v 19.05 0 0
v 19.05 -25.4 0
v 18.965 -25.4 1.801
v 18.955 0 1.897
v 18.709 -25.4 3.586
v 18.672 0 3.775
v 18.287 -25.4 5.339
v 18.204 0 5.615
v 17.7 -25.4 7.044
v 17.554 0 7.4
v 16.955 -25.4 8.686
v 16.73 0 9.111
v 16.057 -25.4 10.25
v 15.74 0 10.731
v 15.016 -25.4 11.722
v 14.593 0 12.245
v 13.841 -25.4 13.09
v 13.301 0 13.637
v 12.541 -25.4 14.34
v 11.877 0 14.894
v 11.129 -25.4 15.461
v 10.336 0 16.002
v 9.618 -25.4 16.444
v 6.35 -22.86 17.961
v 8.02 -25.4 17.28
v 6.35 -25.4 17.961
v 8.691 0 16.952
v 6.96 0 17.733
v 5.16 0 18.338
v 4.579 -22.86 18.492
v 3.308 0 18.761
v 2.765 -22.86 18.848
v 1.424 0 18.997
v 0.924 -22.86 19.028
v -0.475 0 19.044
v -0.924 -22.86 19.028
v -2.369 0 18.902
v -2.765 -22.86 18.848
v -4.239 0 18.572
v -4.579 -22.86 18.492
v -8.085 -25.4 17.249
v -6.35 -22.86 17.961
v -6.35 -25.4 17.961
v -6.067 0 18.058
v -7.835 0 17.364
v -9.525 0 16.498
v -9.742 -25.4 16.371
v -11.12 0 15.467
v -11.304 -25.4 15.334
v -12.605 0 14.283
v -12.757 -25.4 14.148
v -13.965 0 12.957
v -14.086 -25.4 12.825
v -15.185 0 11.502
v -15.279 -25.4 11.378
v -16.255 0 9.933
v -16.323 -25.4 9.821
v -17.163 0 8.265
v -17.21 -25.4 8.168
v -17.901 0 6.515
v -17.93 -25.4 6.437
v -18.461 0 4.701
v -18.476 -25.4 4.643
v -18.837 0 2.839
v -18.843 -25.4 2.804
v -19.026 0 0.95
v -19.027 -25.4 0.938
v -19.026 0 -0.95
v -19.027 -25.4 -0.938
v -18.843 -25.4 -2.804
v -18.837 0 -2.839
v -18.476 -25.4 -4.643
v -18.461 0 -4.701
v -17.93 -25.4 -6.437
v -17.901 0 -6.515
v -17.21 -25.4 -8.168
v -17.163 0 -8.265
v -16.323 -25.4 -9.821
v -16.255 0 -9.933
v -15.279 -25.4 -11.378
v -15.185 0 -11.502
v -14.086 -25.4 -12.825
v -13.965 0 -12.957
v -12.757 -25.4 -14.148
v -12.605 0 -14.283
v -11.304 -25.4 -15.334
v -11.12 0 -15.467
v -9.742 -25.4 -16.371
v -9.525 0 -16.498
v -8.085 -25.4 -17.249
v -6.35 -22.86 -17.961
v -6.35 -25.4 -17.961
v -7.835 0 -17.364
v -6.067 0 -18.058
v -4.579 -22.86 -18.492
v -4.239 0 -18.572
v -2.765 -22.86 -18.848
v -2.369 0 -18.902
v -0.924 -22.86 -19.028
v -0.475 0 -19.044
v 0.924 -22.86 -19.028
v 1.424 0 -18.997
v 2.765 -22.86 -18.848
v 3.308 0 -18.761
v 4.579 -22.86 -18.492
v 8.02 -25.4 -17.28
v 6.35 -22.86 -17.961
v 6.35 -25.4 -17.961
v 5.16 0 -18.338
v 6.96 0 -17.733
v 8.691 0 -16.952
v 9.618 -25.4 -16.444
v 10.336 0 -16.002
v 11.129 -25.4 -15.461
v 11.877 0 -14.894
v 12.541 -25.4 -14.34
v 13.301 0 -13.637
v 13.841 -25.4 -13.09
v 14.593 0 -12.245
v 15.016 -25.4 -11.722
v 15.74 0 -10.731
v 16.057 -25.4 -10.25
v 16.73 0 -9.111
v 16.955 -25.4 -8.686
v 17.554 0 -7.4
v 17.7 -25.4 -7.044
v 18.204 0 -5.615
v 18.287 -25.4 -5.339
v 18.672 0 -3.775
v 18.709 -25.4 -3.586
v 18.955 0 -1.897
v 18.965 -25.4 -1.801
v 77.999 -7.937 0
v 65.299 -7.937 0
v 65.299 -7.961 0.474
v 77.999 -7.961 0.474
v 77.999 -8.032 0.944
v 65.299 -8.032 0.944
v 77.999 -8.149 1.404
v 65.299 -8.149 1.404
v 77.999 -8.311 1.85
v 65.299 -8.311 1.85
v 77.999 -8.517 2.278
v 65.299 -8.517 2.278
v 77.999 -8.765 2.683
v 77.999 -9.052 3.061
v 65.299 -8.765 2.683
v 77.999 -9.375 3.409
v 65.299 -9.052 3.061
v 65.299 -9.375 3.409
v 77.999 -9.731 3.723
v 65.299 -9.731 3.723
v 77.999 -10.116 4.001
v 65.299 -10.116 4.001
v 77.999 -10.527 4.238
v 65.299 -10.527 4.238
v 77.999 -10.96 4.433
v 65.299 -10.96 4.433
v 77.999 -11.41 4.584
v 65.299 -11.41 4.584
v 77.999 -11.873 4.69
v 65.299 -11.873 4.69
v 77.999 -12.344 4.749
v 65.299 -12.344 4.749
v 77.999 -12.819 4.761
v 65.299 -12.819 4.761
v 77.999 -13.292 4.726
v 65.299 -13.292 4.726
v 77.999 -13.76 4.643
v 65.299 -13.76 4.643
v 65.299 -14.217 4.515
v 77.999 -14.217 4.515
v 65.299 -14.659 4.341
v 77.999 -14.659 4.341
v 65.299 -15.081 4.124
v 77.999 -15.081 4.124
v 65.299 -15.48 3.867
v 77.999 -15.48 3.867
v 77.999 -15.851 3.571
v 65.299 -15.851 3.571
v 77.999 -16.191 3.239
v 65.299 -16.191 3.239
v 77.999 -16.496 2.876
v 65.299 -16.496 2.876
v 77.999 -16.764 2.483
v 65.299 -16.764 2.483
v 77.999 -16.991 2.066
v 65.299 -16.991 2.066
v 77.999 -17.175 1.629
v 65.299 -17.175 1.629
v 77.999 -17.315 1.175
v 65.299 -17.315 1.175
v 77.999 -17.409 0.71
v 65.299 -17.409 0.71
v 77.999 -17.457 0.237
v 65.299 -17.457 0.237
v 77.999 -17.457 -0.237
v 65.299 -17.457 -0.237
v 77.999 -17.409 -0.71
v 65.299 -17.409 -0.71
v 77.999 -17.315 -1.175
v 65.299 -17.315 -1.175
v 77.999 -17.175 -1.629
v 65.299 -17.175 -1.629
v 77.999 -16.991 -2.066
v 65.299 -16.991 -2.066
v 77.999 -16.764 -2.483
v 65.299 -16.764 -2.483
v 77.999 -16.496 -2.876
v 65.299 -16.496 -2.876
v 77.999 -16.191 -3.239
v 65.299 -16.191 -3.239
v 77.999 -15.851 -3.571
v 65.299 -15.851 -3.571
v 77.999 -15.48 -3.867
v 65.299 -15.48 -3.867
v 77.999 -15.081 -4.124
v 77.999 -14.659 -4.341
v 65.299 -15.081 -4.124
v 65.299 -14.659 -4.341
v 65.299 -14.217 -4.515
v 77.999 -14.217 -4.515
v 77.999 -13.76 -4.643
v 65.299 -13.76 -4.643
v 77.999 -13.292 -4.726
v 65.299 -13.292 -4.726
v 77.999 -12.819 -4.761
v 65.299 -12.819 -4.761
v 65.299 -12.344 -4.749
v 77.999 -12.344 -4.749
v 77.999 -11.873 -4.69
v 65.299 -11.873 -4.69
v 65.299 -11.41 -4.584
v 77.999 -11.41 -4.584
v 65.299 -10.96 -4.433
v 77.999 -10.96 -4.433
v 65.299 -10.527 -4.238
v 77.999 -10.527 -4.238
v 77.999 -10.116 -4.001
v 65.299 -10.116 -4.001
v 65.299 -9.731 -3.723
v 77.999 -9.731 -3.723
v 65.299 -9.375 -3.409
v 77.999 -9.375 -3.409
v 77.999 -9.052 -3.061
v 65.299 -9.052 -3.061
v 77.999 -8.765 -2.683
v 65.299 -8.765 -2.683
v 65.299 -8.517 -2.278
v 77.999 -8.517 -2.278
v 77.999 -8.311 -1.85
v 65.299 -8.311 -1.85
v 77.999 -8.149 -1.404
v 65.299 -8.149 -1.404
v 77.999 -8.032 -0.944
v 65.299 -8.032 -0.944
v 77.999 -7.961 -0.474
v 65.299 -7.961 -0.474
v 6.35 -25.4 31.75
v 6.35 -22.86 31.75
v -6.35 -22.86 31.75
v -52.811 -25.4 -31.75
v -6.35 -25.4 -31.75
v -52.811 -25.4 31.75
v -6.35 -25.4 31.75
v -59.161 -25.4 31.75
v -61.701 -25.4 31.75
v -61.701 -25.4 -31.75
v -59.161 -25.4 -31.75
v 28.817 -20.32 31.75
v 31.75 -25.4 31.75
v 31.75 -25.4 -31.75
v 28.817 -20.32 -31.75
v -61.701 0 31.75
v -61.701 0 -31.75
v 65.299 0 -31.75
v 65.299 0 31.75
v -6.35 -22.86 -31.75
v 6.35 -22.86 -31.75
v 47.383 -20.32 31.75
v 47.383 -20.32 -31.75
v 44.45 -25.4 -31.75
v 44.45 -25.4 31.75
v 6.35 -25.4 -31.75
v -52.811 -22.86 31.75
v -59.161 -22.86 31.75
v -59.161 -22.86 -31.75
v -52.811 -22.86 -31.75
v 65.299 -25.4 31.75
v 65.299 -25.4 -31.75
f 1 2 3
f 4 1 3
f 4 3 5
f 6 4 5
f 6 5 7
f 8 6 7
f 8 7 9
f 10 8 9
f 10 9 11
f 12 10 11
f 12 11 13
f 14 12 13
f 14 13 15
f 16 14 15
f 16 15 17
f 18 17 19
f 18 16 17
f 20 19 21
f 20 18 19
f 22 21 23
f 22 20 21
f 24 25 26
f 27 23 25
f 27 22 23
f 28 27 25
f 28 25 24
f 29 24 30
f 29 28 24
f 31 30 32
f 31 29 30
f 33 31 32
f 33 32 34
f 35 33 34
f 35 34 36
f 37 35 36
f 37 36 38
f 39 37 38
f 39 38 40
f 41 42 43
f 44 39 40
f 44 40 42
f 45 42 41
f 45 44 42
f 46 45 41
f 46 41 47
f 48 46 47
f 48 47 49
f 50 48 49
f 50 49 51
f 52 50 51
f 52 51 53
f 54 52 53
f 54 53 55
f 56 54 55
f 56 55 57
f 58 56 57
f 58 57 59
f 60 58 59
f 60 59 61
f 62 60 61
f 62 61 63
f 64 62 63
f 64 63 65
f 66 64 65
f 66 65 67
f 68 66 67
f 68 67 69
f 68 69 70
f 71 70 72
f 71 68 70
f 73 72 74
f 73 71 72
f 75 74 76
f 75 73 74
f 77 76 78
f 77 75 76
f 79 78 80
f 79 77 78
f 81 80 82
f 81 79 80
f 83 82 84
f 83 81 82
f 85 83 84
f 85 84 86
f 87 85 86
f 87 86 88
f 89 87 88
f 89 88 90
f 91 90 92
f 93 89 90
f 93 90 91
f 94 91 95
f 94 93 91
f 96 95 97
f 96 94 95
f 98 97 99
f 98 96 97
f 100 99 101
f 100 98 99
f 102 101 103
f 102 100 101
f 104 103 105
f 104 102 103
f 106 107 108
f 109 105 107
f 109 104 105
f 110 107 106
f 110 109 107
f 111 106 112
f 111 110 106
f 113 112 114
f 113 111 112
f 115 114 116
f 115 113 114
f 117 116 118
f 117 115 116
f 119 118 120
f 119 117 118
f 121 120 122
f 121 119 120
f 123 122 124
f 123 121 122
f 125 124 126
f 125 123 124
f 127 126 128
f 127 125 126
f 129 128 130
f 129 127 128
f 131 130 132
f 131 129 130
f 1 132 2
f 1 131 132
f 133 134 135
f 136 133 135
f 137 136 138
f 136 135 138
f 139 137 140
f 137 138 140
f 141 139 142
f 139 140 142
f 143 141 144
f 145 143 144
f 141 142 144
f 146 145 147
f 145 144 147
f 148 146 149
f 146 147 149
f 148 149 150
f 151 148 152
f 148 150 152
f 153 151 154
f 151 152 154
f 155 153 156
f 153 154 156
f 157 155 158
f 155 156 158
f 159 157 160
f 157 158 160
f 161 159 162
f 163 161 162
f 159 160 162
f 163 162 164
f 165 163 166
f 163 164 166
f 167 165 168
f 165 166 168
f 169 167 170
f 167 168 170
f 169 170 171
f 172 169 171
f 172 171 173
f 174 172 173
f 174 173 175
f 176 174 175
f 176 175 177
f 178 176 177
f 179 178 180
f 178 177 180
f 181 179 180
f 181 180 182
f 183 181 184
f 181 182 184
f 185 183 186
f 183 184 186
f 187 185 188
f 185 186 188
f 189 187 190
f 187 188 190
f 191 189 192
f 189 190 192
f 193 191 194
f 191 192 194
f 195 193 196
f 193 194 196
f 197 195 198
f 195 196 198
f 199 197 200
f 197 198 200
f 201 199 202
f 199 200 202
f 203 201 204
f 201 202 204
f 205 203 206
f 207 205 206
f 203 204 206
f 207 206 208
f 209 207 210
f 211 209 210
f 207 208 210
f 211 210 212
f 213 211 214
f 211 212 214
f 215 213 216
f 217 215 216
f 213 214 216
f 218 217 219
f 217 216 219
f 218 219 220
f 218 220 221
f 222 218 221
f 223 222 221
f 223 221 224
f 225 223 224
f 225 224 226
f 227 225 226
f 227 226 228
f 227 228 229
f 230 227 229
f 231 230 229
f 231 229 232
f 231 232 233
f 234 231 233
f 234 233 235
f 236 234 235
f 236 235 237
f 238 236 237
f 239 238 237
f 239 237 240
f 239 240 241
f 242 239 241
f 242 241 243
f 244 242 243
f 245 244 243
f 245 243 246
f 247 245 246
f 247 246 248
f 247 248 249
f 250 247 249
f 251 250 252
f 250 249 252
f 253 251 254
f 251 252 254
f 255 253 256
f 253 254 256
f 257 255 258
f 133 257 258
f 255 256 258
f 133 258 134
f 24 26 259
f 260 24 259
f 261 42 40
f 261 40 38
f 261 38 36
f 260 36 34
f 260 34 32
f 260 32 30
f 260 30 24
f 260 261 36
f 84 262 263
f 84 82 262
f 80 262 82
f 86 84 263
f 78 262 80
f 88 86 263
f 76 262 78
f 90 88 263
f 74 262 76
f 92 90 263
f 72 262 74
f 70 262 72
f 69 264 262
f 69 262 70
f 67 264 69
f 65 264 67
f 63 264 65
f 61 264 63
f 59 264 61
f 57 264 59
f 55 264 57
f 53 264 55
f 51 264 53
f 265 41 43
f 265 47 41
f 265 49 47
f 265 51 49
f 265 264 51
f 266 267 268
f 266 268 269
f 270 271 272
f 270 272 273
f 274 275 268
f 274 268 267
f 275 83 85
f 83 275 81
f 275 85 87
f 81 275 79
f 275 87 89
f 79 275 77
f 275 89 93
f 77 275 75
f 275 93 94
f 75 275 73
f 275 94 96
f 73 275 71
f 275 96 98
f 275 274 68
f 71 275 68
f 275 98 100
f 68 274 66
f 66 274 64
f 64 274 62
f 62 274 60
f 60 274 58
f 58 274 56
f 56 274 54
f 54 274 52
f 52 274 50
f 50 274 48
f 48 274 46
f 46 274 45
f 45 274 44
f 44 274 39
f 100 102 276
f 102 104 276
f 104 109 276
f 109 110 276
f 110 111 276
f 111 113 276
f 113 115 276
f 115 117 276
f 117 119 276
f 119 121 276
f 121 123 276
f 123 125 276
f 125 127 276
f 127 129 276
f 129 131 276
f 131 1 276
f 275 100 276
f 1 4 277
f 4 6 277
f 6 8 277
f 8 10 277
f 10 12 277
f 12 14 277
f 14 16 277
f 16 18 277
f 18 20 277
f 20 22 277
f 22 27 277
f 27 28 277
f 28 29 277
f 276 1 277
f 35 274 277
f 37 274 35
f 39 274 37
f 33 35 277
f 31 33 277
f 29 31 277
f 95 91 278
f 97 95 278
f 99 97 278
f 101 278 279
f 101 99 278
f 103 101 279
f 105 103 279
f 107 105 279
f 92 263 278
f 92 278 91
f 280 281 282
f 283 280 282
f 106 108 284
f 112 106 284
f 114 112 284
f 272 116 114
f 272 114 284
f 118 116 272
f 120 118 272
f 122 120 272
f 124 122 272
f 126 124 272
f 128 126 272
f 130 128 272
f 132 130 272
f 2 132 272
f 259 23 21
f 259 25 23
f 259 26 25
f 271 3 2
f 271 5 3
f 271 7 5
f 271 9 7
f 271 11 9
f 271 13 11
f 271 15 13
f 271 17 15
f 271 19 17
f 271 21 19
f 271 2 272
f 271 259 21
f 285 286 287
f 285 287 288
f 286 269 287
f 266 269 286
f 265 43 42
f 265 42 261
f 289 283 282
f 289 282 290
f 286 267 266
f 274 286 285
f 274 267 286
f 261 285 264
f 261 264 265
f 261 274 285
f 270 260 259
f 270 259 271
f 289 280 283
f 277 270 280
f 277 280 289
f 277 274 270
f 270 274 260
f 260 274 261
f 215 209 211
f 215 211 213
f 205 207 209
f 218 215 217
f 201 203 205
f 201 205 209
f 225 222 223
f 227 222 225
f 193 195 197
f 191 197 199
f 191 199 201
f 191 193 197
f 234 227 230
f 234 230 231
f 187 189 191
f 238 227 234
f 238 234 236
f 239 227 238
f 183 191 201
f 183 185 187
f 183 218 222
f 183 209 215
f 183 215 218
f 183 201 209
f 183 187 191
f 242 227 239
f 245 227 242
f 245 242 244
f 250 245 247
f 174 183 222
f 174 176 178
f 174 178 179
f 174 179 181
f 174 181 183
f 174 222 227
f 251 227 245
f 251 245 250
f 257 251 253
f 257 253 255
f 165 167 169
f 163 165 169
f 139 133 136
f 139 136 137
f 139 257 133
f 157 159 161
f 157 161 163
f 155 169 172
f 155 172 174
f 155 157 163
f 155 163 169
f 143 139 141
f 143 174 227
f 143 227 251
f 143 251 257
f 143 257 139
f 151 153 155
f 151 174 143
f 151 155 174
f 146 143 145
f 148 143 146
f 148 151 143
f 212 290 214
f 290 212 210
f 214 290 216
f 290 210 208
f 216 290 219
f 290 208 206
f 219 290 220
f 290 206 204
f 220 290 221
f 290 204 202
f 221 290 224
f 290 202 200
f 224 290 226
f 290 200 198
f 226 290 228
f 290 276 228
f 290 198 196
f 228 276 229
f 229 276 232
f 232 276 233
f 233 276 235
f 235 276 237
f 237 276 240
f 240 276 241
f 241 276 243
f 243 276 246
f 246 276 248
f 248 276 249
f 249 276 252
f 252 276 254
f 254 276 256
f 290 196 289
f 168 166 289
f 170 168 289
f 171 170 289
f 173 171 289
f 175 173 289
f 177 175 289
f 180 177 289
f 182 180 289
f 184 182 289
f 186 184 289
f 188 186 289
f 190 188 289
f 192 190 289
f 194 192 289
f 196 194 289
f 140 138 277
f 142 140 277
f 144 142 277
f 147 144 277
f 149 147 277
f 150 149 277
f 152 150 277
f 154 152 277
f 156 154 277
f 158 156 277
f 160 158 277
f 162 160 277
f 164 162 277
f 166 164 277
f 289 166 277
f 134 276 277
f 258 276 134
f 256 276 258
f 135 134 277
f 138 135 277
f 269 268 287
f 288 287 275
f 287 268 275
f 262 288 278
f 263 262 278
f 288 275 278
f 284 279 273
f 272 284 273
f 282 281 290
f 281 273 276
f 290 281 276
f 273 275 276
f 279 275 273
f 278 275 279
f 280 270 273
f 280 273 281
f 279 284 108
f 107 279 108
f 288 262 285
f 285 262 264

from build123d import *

# Parameters (mm, degrees)
F0_W     = 127
F0_H     = 63.5
F0_R     = 19.05
F1_DEPTH = 25.4
F2_W     = 6.35
F2_H     = 63.5
F2_W_2   = 12.7
F3_DEPTH = 2.54
F5_DEPTH = 66.04
F6_R     = 4.7625
F7_DEPTH = 12.7


with BuildPart() as f1:
    # F0 (on Front) → F1 (new body)
    with BuildSketch(Plane.XZ):
        with Locations((1.798787, 0)):
            Rectangle(F0_W, F0_H)
        Circle(F0_R, mode=Mode.SUBTRACT)
    extrude(amount=F1_DEPTH)

    # F2 (on face) → F3 (cut)
    with BuildSketch(Plane.XZ.offset(25.4)):
        with Locations((-55.986213, 0)):
            Rectangle(F2_W, F2_H)
        Rectangle(F2_W_2, F2_H)
    extrude(amount=-F3_DEPTH, mode=Mode.SUBTRACT)

    # F4 (on face) → F5 (cut)
    with BuildSketch(Plane(origin=(0, 0, -31.75), x_dir=(1, 0, 0), z_dir=(0, 0, -1))):
        Polygon((44.45, 25.4), (31.75, 25.4), (28.817061, 20.32), (47.382939, 20.32), align=None)
    extrude(amount=-F5_DEPTH, mode=Mode.SUBTRACT)

    # F6 (on face) → F7 (join)
    with BuildSketch(Plane.YZ.offset(65.298787)):
        with Locations((-12.7, 0)):
            Circle(F6_R)
    extrude(amount=F7_DEPTH)


solid = f1.part
